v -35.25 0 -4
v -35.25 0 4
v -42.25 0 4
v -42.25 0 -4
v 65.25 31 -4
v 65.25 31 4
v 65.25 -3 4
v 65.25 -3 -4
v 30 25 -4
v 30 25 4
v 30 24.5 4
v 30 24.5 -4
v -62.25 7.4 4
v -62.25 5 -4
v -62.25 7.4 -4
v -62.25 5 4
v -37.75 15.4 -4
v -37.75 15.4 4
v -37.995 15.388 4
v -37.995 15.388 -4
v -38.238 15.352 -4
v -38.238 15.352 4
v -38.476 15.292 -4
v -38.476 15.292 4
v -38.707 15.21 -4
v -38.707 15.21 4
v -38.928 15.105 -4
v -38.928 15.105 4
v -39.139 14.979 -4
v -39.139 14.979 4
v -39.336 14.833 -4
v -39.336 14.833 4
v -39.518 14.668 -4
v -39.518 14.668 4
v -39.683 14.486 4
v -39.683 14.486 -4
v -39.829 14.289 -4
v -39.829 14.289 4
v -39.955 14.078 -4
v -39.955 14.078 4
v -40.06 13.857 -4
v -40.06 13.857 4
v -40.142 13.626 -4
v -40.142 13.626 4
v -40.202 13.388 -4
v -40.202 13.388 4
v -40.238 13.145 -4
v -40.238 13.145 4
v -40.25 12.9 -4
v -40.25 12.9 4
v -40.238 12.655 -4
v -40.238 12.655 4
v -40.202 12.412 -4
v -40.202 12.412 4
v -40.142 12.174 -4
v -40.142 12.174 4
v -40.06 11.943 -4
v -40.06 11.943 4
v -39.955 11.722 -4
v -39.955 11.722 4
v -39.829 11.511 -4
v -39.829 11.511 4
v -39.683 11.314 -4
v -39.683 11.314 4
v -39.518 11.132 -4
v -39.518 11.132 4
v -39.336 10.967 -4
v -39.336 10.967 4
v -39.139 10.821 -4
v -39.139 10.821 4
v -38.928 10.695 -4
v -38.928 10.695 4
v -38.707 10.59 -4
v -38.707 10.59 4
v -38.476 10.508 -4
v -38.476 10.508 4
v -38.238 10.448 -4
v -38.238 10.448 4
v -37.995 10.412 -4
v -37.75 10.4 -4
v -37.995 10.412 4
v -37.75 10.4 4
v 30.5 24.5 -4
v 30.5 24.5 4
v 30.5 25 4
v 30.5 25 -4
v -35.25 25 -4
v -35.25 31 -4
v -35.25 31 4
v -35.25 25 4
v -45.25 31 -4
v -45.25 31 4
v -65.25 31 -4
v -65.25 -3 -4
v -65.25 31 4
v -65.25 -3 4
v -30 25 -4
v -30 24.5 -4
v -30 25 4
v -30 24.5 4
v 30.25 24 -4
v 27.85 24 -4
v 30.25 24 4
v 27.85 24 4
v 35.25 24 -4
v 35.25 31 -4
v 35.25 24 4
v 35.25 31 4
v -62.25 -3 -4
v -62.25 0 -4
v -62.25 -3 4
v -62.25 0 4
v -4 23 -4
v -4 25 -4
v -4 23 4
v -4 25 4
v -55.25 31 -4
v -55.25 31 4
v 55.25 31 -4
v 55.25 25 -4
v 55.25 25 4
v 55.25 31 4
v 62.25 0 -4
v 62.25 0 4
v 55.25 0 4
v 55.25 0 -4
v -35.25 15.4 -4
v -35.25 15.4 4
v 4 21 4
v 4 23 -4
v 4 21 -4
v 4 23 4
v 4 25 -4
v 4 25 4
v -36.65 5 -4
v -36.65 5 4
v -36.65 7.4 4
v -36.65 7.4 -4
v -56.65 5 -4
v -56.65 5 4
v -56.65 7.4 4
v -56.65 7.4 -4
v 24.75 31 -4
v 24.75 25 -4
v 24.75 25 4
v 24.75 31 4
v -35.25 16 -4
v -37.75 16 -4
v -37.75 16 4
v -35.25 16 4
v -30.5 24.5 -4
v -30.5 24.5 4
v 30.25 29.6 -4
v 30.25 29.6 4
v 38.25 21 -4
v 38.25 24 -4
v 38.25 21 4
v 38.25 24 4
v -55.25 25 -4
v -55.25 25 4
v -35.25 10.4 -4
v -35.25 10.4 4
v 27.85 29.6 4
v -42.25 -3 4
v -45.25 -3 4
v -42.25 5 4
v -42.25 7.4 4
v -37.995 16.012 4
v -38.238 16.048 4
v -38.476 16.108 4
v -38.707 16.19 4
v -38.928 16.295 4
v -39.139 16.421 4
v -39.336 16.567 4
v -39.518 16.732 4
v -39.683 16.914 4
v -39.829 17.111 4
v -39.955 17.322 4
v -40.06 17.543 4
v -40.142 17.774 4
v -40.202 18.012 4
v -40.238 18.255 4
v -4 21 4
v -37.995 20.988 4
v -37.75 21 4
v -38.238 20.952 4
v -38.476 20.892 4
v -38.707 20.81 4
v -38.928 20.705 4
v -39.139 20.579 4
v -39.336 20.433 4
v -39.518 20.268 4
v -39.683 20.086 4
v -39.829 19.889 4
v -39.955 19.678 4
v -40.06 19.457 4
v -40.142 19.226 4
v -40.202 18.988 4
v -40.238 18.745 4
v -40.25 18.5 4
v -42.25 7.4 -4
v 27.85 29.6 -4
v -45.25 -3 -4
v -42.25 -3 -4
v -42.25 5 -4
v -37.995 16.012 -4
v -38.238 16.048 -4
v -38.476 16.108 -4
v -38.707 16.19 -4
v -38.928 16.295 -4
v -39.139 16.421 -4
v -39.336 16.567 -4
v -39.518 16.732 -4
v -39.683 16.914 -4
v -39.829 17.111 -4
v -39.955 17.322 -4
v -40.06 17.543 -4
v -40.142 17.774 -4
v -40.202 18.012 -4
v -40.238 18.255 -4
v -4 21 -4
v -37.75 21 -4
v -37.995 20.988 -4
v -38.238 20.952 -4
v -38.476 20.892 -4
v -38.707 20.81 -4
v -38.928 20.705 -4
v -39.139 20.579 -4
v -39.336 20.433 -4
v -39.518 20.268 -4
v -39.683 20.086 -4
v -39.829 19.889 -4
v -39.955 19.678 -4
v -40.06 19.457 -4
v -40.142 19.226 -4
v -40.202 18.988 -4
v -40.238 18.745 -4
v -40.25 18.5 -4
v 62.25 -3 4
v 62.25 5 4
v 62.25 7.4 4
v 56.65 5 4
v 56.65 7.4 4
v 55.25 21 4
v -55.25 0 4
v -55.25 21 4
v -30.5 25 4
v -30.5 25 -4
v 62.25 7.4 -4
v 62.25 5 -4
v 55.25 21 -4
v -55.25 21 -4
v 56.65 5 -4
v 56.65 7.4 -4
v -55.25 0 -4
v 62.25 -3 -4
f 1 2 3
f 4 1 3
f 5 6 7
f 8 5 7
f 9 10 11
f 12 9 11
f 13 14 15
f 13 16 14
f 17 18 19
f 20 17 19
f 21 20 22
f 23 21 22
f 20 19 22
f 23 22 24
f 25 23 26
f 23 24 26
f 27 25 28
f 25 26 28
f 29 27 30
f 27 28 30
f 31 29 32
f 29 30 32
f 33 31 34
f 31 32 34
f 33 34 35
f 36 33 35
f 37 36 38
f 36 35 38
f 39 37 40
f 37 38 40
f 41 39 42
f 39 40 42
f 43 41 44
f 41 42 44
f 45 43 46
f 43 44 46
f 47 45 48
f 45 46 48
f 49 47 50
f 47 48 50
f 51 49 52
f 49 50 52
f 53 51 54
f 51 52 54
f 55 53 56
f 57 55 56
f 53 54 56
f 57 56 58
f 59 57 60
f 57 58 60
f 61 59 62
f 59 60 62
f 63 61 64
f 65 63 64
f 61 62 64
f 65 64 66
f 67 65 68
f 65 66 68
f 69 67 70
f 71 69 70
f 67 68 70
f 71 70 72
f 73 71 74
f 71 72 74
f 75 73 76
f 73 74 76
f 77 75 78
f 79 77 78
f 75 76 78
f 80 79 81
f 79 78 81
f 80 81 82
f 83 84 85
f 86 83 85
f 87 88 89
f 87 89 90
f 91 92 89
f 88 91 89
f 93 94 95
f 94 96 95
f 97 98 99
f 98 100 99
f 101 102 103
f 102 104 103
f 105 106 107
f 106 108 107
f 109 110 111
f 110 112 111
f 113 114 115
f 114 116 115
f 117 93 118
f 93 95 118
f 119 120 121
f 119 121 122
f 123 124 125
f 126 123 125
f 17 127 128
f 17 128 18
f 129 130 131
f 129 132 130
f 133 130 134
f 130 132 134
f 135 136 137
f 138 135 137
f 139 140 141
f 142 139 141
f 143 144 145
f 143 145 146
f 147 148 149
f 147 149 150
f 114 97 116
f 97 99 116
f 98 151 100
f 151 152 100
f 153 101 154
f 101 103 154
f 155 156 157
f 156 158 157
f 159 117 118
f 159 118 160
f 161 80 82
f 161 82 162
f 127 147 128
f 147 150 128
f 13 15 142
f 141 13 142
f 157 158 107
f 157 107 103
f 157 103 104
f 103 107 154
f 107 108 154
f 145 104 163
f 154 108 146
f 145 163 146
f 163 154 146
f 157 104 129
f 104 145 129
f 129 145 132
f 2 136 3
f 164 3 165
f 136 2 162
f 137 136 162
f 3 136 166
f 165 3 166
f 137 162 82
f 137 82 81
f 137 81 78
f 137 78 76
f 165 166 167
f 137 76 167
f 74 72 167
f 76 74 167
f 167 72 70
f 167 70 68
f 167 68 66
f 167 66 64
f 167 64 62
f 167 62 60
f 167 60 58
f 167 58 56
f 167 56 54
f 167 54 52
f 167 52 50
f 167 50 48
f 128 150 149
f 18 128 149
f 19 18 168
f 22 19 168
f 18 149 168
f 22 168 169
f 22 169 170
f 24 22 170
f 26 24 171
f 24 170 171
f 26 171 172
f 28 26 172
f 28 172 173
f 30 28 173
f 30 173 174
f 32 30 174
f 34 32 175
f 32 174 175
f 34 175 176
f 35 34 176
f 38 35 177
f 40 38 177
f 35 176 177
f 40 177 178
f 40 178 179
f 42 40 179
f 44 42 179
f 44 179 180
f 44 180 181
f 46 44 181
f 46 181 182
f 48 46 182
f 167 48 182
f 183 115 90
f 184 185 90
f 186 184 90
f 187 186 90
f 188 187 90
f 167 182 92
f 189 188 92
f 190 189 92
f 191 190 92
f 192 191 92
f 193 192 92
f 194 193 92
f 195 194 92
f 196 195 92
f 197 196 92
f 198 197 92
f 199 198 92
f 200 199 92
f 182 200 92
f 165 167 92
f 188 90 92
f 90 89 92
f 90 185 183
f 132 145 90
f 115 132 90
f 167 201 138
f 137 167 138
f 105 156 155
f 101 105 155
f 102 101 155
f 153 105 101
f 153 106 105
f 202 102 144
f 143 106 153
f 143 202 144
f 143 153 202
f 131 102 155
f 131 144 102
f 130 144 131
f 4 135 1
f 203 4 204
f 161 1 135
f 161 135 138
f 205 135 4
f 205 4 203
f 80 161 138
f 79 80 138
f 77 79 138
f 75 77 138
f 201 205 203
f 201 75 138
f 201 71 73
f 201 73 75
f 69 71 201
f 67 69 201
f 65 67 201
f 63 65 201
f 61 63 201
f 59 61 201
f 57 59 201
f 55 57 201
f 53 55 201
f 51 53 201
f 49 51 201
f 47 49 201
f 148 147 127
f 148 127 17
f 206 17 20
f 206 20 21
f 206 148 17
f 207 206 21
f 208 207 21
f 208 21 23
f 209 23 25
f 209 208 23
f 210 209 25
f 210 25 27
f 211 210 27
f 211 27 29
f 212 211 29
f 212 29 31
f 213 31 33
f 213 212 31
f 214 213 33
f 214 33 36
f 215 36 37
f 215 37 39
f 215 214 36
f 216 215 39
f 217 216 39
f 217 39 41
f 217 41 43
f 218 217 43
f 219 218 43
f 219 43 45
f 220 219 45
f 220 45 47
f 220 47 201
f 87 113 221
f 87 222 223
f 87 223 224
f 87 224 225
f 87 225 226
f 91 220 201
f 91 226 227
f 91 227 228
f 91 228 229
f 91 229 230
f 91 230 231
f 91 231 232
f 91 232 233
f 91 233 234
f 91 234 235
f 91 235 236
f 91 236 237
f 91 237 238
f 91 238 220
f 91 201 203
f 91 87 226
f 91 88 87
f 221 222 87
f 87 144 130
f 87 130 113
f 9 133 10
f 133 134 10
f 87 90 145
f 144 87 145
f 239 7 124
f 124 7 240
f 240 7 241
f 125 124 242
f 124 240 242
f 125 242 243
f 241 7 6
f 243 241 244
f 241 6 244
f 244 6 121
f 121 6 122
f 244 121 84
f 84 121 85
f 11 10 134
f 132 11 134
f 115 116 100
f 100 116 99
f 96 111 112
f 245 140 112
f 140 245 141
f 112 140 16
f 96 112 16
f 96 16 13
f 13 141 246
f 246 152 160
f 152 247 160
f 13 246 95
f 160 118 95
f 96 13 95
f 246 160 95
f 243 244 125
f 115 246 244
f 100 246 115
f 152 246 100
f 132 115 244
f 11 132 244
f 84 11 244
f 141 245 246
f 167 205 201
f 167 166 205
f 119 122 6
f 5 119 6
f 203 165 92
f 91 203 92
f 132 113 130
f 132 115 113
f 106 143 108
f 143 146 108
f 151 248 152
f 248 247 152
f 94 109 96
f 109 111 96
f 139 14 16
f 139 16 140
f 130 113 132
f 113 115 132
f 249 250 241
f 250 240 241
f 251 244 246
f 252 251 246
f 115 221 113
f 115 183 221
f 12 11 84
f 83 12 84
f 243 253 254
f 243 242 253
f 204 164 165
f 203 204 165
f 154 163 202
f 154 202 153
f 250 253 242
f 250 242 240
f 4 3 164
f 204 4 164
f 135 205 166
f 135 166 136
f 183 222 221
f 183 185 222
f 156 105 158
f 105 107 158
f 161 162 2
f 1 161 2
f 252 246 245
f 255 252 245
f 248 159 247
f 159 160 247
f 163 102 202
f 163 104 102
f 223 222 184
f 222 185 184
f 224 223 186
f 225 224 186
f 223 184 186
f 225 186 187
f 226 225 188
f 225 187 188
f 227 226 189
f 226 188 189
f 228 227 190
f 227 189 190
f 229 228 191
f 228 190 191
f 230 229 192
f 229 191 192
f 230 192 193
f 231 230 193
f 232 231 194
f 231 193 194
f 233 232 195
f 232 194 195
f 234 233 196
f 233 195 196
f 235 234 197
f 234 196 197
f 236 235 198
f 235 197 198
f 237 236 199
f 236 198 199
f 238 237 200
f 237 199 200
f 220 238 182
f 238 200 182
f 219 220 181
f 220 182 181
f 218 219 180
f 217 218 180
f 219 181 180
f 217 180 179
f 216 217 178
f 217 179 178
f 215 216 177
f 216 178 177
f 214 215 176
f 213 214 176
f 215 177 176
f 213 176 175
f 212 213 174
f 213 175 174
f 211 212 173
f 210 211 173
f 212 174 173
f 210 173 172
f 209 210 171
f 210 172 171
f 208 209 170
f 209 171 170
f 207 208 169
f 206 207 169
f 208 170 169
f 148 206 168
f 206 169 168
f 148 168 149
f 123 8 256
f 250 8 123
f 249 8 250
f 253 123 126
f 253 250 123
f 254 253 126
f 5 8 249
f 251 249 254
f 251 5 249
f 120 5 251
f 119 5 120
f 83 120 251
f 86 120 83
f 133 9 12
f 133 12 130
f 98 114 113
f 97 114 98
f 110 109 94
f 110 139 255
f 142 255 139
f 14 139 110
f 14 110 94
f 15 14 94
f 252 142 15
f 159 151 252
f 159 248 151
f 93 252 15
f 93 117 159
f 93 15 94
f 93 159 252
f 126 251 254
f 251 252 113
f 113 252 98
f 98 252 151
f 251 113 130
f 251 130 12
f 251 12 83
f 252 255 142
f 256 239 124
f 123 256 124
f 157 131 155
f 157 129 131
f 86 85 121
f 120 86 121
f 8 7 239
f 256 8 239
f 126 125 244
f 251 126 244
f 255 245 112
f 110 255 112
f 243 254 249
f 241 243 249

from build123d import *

# Parameters (mm, degrees)
SKETCH_W      = 5.6
SKETCH_H      = 2.4
PAD_DEPTH     = 4
SKETCH001_W   = 2.4
SKETCH001_H   = 5.6
SKETCH001_W_2 = 5.6
SKETCH001_H_2 = 2.4
PAD001_DEPTH  = 4


with BuildPart() as longbatteryholder:
    # Sketch → Pad (new body, symmetric)
    with BuildSketch(Plane.XY):
        Polygon((-55.25, 0), (-62.25, 0), (-62.25, -3), (-65.25, -3), (-65.25, 31), (-55.25, 31), (-55.25, 25), (-30.5, 25), (-30.5, 24.5), (-30, 24.5), (-30, 25), (-4, 25), (-4, 23), (4, 23), (4, 25), (30, 25), (30, 24.5), (30.5, 24.5), (30.5, 25), (55.25, 25), (55.25, 31), (65.25, 31), (65.25, -3), (62.25, -3), (62.25, 0), (55.25, 0), (55.25, 21), (-55.25, 21), align=None)
        with Locations((59.45, 6.2)):
            Rectangle(SKETCH_W, SKETCH_H, mode=Mode.SUBTRACT)
        with Locations((-59.45, 6.2)):
            Rectangle(SKETCH_W, SKETCH_H, mode=Mode.SUBTRACT)
    extrude(amount=PAD_DEPTH, both=True)


with BuildPart() as shortbatteryholder:
    # Sketch001 → Pad001 (new body, symmetric)
    with BuildSketch(Plane.XY):
        with BuildLine():
            Line((24.75, 25), (24.75, 31))
            Line((24.75, 31), (35.25, 31))
            Line((35.25, 31), (35.25, 24))
            Line((35.25, 24), (38.25, 24))
            Line((38.25, 24), (38.25, 21))
            Line((38.25, 21), (35.25, 21))
            Line((4, 21), (35.25, 21))
            Line((4, 23), (4, 21))
            Line((-4, 23), (4, 23))
            Line((-4, 21), (-4, 23))
            Line((-35.25, 21), (-4, 21))
            Line((-35.25, 21), (-37.75, 21))
            ThreePointArc((-37.75, 21), (-40.25, 18.5), (-37.75, 16))
            Line((-37.75, 16), (-35.25, 16))
            Line((-35.25, 16), (-35.25, 15.4))
            Line((-35.25, 15.4), (-37.75, 15.4))
            ThreePointArc((-37.75, 15.4), (-40.25, 12.9), (-37.75, 10.4))
            Line((-37.75, 10.4), (-35.25, 10.4))
            Line((-35.25, 10.4), (-35.25, 0))
            Line((-35.25, 0), (-42.25, 0))
            Line((-42.25, 0), (-42.25, -3))
            Line((-42.25, -3), (-45.25, -3))
            Line((-45.25, -3), (-45.25, 31))
            Line((-45.25, 31), (-35.25, 31))
            Line((-35.25, 31), (-35.25, 25))
            Line((-35.25, 25), (24.75, 25))
        make_face()
        with Locations((29.05, 26.8)):
            Rectangle(SKETCH001_W, SKETCH001_H, mode=Mode.SUBTRACT)
        with Locations((-39.45, 6.2)):
            Rectangle(SKETCH001_W_2, SKETCH001_H_2, mode=Mode.SUBTRACT)
    extrude(amount=PAD001_DEPTH, both=True)


solid = Compound([longbatteryholder.part, shortbatteryholder.part])
